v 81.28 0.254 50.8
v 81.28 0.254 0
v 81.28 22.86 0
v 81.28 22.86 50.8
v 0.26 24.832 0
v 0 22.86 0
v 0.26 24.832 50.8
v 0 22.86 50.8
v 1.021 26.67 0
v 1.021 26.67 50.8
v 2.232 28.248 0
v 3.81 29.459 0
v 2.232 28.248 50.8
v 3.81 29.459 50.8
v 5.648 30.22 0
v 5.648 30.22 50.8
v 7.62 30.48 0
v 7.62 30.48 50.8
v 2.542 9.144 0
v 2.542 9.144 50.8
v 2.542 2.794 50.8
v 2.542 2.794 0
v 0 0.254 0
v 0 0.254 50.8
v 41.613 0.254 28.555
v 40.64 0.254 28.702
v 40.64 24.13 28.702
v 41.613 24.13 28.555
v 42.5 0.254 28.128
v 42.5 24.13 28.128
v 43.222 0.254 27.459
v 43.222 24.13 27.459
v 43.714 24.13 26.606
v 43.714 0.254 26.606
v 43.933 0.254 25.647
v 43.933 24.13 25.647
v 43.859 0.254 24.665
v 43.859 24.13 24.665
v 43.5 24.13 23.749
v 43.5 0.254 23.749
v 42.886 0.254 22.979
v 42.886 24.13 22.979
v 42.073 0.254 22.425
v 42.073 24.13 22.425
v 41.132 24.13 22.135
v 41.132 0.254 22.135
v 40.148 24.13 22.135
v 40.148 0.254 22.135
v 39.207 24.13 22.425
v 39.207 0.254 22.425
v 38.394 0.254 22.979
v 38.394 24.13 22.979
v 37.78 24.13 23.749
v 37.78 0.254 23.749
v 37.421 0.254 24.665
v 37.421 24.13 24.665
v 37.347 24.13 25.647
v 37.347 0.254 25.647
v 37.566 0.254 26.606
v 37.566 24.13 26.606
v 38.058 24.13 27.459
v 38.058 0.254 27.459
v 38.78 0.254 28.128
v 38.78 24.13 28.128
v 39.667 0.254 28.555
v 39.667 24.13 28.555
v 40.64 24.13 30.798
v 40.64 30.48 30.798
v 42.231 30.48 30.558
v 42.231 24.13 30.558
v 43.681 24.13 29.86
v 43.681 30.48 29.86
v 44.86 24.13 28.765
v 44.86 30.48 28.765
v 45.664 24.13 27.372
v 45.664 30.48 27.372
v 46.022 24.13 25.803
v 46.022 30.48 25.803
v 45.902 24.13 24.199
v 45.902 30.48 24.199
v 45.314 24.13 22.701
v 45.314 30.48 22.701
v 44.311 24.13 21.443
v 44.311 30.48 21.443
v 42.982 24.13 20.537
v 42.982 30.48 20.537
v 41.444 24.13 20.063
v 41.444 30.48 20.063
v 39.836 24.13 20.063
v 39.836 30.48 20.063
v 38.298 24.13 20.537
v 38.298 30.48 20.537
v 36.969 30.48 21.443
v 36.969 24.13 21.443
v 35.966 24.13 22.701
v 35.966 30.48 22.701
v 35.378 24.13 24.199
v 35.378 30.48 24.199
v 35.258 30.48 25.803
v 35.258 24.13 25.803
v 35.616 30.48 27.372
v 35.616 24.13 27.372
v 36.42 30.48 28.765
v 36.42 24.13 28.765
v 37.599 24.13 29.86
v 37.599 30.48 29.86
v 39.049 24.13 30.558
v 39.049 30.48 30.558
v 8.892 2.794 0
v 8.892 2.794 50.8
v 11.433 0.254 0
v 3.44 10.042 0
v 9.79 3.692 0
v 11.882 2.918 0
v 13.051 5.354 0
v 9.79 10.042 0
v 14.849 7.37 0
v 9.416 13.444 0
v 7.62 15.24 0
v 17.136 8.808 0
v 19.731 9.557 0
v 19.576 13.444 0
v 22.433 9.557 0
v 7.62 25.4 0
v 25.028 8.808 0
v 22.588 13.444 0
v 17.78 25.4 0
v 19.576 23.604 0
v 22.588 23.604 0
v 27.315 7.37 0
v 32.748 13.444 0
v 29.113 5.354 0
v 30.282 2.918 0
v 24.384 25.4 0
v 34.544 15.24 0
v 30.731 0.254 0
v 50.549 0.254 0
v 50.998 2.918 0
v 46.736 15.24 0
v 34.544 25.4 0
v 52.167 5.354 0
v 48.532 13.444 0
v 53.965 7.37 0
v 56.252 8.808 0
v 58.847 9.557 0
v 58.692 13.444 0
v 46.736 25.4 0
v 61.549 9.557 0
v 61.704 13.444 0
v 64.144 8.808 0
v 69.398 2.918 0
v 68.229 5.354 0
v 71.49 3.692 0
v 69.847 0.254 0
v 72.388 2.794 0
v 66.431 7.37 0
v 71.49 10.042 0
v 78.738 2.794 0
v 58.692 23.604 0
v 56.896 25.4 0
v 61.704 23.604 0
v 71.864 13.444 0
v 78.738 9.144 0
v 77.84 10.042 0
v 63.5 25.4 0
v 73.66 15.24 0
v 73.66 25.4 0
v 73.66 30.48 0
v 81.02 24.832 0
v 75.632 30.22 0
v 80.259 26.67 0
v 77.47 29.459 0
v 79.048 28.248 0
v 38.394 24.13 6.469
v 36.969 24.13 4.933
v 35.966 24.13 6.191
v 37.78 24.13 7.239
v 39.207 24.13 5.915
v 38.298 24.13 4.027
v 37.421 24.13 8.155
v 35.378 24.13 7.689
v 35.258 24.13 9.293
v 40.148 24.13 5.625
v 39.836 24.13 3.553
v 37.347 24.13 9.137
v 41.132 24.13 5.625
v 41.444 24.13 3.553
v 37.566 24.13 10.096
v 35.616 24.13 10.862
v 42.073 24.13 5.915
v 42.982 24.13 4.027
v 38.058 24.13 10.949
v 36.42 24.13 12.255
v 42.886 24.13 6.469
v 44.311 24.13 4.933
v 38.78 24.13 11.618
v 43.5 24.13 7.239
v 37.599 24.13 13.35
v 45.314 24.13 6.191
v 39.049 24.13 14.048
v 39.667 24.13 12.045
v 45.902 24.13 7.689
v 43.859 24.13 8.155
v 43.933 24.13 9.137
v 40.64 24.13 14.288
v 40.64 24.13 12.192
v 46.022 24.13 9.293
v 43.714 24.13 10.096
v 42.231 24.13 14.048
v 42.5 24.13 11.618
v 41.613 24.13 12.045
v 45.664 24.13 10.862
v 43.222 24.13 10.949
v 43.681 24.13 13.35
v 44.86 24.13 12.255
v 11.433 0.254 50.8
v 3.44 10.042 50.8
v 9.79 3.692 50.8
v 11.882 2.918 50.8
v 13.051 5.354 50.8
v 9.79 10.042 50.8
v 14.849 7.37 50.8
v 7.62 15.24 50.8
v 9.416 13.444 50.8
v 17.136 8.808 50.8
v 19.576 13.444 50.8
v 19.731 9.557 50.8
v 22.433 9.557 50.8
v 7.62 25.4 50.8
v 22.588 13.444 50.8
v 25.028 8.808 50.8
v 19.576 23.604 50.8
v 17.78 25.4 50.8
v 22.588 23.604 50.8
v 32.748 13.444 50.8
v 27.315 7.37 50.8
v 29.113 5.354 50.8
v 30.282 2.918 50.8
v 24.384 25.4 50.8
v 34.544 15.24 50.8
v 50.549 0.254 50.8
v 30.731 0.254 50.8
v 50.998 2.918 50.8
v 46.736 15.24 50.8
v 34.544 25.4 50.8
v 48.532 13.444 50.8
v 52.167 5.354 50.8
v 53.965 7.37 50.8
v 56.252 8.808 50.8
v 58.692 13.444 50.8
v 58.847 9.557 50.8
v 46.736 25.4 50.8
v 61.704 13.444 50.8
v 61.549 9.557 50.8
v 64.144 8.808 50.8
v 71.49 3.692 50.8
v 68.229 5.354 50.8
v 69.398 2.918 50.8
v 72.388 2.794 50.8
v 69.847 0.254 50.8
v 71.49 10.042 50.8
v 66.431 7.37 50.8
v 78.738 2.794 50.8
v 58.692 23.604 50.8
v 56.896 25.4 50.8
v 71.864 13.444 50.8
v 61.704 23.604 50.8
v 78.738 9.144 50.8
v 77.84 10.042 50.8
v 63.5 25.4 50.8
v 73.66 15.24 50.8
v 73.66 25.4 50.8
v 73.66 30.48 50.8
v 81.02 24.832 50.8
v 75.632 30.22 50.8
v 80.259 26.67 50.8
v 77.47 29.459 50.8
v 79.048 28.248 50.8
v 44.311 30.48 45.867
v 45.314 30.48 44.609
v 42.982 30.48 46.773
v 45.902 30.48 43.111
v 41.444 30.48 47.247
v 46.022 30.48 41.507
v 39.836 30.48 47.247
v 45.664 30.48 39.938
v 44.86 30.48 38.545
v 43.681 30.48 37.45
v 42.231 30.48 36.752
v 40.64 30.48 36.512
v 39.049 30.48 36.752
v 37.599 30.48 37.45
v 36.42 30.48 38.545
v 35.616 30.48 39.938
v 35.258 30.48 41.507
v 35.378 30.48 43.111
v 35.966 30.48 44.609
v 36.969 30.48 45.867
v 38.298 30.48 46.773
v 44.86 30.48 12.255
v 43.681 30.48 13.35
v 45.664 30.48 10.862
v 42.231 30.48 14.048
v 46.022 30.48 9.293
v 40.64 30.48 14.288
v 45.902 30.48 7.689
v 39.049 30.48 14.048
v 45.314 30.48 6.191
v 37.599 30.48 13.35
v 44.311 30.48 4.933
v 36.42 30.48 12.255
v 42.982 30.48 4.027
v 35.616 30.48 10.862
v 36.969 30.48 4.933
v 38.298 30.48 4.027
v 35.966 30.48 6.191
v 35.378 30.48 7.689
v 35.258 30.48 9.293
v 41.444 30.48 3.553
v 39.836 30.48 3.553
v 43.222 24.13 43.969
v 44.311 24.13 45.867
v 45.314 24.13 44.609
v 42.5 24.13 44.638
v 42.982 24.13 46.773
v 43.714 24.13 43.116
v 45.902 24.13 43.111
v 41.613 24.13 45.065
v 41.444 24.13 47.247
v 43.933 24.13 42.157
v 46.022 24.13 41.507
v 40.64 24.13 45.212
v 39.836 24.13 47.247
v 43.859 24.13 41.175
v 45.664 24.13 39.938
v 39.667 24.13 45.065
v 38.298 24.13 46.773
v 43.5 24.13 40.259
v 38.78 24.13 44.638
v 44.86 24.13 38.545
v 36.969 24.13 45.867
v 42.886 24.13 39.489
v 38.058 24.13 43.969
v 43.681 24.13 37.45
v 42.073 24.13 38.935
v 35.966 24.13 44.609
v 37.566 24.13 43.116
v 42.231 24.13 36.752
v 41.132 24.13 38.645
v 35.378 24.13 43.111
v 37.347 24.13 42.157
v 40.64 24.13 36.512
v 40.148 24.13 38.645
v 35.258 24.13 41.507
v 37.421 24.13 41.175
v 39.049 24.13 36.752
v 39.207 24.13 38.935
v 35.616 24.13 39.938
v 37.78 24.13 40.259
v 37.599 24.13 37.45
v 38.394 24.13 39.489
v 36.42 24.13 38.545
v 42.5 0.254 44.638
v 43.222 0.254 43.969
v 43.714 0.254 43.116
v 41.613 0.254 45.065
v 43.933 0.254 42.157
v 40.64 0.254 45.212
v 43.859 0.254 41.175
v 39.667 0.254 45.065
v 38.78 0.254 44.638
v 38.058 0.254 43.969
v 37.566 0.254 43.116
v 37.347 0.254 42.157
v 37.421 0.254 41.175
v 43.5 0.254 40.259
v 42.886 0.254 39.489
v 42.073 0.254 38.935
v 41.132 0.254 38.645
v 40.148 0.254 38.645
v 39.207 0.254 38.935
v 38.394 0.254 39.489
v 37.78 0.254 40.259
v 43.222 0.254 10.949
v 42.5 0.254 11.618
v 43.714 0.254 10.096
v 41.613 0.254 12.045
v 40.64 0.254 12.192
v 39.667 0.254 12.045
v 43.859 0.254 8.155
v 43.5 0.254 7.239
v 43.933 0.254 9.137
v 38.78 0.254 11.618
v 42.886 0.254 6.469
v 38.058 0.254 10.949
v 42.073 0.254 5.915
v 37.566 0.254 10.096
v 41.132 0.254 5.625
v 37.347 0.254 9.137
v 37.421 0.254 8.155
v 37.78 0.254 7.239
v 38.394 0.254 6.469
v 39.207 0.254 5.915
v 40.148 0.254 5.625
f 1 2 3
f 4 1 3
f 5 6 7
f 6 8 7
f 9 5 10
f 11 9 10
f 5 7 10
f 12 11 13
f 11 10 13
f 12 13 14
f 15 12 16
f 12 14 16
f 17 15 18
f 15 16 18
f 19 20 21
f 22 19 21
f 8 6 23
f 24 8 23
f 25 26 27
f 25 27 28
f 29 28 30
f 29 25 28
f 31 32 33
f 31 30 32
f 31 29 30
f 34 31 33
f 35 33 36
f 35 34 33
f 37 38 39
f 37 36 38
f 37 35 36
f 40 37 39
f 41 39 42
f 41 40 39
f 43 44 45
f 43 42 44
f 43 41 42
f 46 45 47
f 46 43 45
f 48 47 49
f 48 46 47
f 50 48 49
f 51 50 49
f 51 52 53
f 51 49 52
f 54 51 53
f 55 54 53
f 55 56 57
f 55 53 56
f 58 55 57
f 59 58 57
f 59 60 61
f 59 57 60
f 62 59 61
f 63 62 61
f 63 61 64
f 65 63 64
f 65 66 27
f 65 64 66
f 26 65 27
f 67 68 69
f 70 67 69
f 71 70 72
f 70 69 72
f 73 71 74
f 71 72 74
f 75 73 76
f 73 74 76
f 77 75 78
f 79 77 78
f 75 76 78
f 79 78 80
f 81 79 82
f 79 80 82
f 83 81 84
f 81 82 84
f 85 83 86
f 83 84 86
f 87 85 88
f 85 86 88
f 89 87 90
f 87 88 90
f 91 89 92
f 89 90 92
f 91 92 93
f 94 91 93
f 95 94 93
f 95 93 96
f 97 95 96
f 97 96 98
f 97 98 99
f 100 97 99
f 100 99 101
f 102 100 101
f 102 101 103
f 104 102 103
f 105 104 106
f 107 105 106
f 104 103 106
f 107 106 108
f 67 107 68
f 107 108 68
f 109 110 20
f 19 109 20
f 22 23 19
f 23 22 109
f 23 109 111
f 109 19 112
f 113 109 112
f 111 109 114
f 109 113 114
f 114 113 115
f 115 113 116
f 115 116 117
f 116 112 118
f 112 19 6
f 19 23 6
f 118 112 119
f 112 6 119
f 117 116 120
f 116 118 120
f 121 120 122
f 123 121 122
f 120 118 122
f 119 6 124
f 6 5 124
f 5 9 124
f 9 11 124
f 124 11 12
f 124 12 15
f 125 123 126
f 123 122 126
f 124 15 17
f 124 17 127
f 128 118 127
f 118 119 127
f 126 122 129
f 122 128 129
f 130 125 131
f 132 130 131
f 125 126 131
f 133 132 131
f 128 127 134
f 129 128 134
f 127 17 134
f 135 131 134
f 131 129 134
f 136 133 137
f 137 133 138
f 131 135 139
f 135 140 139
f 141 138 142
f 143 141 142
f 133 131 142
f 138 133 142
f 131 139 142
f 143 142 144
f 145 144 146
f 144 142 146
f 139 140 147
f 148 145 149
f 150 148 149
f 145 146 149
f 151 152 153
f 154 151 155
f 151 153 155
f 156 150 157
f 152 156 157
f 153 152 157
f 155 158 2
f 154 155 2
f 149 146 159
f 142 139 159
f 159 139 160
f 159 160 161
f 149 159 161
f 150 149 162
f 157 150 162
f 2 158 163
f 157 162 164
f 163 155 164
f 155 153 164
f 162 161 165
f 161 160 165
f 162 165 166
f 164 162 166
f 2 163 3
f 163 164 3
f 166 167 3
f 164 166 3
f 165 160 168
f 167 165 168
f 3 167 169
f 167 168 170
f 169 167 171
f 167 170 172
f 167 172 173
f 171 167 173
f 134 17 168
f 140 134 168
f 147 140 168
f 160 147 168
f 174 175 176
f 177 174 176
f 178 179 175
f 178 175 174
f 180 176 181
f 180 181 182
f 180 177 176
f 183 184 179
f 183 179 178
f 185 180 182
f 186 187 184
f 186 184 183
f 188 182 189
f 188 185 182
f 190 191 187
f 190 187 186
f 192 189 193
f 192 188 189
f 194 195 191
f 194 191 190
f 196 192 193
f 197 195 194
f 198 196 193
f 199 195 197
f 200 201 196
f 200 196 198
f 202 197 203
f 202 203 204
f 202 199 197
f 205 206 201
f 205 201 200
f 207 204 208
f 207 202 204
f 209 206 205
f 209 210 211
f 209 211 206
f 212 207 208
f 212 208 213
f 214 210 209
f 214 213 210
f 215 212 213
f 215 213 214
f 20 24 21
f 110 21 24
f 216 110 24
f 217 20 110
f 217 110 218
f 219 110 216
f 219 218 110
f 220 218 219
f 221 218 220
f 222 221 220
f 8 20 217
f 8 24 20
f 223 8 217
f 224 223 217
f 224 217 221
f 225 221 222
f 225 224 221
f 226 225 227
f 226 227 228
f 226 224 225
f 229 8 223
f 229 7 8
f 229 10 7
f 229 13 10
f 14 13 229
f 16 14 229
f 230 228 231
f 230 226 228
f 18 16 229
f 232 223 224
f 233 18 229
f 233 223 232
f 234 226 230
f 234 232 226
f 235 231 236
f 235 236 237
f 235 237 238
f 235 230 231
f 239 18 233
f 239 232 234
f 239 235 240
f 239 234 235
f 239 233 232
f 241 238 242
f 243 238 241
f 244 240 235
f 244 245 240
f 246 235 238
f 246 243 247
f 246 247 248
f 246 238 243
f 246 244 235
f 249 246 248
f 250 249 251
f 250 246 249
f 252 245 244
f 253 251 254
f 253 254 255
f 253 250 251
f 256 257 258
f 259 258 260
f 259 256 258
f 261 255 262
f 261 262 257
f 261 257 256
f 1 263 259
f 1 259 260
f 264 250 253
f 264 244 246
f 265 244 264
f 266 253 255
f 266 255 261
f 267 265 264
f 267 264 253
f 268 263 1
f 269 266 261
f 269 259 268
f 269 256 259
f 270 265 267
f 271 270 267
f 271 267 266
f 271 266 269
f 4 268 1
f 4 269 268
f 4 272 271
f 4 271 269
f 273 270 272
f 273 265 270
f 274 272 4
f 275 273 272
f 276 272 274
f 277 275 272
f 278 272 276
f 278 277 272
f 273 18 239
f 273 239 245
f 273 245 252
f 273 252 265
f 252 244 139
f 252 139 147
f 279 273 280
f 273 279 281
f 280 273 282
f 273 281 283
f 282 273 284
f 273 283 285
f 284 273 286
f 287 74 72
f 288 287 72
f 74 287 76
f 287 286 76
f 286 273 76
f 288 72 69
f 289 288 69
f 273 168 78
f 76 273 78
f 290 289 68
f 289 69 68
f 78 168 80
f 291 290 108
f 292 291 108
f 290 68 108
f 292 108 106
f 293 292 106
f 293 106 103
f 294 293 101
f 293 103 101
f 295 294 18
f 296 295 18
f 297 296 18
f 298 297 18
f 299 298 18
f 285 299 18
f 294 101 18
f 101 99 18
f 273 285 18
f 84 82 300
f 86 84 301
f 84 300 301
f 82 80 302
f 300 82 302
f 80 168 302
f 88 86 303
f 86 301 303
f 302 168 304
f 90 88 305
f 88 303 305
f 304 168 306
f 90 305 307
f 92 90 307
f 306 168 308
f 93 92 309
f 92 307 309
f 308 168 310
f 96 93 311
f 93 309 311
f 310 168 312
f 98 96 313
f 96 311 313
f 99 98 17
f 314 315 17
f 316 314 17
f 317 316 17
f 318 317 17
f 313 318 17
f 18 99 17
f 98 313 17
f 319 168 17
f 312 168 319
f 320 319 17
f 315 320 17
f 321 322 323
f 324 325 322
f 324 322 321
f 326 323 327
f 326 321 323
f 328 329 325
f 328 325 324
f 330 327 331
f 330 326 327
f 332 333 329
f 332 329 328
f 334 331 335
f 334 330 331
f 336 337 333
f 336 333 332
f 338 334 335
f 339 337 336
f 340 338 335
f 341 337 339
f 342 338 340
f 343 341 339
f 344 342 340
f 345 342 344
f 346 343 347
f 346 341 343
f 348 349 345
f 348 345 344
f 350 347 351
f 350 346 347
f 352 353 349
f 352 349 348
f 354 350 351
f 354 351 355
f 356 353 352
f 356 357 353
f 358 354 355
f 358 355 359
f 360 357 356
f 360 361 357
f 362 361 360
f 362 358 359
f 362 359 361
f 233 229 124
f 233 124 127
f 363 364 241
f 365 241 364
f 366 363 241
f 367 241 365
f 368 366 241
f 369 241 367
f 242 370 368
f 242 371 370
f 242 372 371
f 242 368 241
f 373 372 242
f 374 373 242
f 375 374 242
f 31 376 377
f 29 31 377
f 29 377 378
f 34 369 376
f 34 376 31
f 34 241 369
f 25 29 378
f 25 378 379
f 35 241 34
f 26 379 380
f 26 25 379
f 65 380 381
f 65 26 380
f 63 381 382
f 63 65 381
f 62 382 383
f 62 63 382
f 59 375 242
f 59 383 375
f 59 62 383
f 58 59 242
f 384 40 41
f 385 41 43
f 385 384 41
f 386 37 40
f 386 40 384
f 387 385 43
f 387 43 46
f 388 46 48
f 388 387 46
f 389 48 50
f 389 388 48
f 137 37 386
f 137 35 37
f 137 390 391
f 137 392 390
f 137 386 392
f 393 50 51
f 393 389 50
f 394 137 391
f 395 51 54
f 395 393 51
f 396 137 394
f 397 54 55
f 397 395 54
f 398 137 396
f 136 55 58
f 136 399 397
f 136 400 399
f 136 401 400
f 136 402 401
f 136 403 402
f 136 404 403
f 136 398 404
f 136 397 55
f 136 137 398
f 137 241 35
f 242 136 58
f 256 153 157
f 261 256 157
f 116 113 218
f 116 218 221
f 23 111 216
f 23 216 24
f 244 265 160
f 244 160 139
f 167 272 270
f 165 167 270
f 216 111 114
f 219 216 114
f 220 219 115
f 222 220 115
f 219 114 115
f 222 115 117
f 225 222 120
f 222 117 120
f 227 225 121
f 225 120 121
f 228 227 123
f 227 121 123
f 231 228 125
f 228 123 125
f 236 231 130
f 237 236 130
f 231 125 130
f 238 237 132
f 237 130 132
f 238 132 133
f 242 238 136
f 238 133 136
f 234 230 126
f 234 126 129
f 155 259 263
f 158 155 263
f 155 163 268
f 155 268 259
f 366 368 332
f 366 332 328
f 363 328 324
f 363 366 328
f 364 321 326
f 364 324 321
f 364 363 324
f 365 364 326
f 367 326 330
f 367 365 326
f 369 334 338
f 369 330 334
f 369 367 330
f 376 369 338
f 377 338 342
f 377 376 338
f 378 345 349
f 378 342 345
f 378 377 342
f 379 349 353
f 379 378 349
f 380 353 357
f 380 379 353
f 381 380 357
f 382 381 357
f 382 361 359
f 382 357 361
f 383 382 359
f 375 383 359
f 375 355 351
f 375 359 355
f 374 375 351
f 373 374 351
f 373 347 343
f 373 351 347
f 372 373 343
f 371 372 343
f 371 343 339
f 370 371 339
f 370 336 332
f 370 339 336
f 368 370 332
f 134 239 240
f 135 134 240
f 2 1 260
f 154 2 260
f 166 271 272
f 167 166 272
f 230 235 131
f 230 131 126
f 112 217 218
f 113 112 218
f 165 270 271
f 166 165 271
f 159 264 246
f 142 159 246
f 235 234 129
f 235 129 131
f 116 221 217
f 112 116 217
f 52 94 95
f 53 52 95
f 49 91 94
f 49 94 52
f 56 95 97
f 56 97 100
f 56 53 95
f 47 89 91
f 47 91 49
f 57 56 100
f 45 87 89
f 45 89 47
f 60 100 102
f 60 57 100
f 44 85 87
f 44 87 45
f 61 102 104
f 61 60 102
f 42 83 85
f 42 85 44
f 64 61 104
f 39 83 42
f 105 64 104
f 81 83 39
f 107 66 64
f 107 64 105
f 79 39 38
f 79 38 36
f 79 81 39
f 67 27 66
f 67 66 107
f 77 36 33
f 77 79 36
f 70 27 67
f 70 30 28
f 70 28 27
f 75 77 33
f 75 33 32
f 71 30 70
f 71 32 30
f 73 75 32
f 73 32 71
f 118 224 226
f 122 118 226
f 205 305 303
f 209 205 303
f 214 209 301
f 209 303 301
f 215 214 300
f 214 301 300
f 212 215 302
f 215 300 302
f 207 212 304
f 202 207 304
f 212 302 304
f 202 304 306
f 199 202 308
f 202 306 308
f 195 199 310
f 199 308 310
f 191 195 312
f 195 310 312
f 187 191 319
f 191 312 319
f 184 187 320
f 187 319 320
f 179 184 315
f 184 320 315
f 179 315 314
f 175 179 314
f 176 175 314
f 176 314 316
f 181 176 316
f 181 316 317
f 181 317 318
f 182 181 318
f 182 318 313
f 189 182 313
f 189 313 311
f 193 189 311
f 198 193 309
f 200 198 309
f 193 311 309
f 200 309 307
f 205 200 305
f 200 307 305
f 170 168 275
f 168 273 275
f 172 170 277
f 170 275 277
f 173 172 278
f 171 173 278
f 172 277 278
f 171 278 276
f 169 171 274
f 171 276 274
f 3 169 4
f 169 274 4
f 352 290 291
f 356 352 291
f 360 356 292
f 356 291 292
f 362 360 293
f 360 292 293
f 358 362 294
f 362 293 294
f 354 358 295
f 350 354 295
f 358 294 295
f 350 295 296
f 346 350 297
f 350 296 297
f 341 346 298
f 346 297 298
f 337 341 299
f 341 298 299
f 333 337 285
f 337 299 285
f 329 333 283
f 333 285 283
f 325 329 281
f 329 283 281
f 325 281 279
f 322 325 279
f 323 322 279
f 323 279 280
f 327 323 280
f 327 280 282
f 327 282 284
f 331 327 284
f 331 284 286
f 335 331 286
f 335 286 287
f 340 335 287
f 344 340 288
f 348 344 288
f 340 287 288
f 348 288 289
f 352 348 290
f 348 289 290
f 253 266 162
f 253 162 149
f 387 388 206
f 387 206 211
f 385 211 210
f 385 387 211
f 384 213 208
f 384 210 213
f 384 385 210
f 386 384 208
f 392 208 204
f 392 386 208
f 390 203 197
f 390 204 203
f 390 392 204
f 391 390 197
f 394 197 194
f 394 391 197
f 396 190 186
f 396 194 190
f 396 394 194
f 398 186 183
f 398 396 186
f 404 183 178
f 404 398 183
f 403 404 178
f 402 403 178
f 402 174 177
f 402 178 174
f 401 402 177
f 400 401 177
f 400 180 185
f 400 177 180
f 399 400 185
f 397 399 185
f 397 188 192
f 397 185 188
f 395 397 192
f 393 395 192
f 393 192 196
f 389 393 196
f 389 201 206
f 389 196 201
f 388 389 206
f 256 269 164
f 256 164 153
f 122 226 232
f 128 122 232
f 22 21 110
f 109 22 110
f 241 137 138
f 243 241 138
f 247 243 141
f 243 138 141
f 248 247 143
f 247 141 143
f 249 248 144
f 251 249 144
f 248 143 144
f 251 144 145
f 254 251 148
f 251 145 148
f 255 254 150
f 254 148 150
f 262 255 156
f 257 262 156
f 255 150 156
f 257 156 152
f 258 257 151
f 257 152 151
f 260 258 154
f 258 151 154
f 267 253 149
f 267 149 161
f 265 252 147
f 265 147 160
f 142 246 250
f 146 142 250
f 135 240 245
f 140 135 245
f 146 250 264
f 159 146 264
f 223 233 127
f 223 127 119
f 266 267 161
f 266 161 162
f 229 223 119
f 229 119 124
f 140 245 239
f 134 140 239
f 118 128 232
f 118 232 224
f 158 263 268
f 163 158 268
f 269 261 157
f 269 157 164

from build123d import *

# Parameters (mm, degrees)
BOSS_EXTRUDE1_DEPTH     = 50.8
SKETCH2_W               = 81.28
SKETCH2_H               = 50.8
CUT_EXTRUDE1_DEPTH      = 0.254
SKETCH3_R               = 5.3975
CUT_EXTRUDE2_DEPTH      = 6.35
CUT_EXTRUDE3_DEPTH      = 99.778245459
CUT_EXTRUDE3_DEPTH_BACK = 99.778245459
SKETCH4_R               = 3.302
CUT_EXTRUDE4_DEPTH      = 101.578868556
FILLET1_R               = 7.62


with BuildPart() as part:
    # Sketch1 → Boss-Extrude1 (new body)
    with BuildSketch(Plane.XY):
        with BuildLine():
            Line((30.734, 0), (40.64, 0))
            Line((40.64, 0), (40.64, 30.48))
            Line((40.64, 30.48), (0, 30.48))
            Line((0, 30.48), (0, 0))
            Line((0, 0), (11.43, 0))
            ThreePointArc((11.43, 0), (21.082, 9.652), (30.734, 0))
        make_face()
        with BuildLine():
            Line((40.64, 30.48), (40.64, 0))
            Line((40.64, 0), (50.546, 0))
            ThreePointArc((50.546, 0), (60.198, 9.652), (69.85, 0))
            Line((69.85, 0), (81.28, 0))
            Line((81.28, 0), (81.28, 30.48))
            Line((81.28, 30.48), (40.64, 30.48))
        make_face()
    extrude(amount=BOSS_EXTRUDE1_DEPTH)

    # Sketch2 → Cut-Extrude1 (cut)
    with BuildSketch(Plane(origin=(0, 0, 0), x_dir=(-1, 0, 0), z_dir=(0, -1, 0))):
        with Locations((-40.64, -25.4)):
            Rectangle(SKETCH2_W, SKETCH2_H)
    extrude(amount=-CUT_EXTRUDE1_DEPTH, mode=Mode.SUBTRACT)

    # Sketch3 → Cut-Extrude2 (cut)
    with BuildSketch(Plane(origin=(0, 30.48, 0), x_dir=(1, 0, 0), z_dir=(0, 1, 0))):
        with Locations(Location((40.64, -8.89, 0), (0, 0, 270))):
            Circle(SKETCH3_R)
        with Locations(Location((40.64, -41.91, 0), (0, 0, 90))):
            Circle(SKETCH3_R)
        with Locations(Location((40.64, -25.4, 0), (0, 0, 270))):
            Circle(SKETCH3_R)
    extrude(amount=-CUT_EXTRUDE2_DEPTH, mode=Mode.SUBTRACT)

    # Sketch4 → Cut-Extrude3 (cut, two sides: drawn at the far end of the back side and taken through both)
    with BuildSketch(Plane(origin=(0, 24.13, 0), x_dir=(1, 0, 0), z_dir=(0, 1, 0)).offset(-CUT_EXTRUDE3_DEPTH_BACK)):
        with Locations(Location((40.64, -8.89, 0), (0, 0, 270))):
            Circle(SKETCH4_R)
        with Locations(Location((40.64, -41.91, 0), (0, 0, 270))):
            Circle(SKETCH4_R)
        with Locations(Location((40.64, -25.4, 0), (0, 0, 270))):
            Circle(SKETCH4_R)
    extrude(amount=CUT_EXTRUDE3_DEPTH + CUT_EXTRUDE3_DEPTH_BACK, mode=Mode.SUBTRACT)

    # Sketch5 → Cut-Extrude4 (cut, through all)
    with BuildSketch(Plane.XY.offset(50.8)):
        Polygon((7.62, 15.24), (7.62, 25.4), (17.78, 25.4), align=None)
        Polygon((19.576051224, 13.443948776), (19.576051224, 23.603948776), (9.416051224, 13.443948776), align=None)
        Polygon((22.587948776, 23.603948776), (32.747948776, 13.443948776), (22.587948776, 13.443948776), align=None)
        Polygon((24.384, 25.4), (34.544, 15.24), (34.544, 25.4), align=None)
        Polygon((46.736, 15.24), (46.736, 25.4), (56.896, 25.4), align=None)
        Polygon((58.692051224, 13.443948776), (58.692051224, 23.603948776), (48.532051224, 13.443948776), align=None)
        Polygon((61.703948776, 23.603948776), (71.863948776, 13.443948776), (61.703948776, 13.443948776), align=None)
        Polygon((63.5, 25.4), (73.66, 15.24), (73.66, 25.4), align=None)
        Polygon((2.541671342, 2.794), (8.891671342, 2.794), (2.541671342, 9.144), align=None)
        Polygon((3.439696954, 10.042025612), (9.789696954, 3.692025612), (9.789696954, 10.042025612), align=None)
        Polygon((71.490303046, 10.042025612), (77.840303046, 10.042025612), (71.490303046, 3.692025612), align=None)
        Polygon((78.738328658, 9.144), (72.388328658, 2.794), (78.738328658, 2.794), align=None)
    extrude(amount=-CUT_EXTRUDE4_DEPTH, mode=Mode.SUBTRACT)

    # Fillet1
    fillet1_edges = [part.edges().sort_by_distance(p)[0] for p in [
        (0, 30.48, 25.4),
        (81.28, 30.48, 25.4),
    ]]
    fillet(fillet1_edges, radius=FILLET1_R)


solid = part.part
